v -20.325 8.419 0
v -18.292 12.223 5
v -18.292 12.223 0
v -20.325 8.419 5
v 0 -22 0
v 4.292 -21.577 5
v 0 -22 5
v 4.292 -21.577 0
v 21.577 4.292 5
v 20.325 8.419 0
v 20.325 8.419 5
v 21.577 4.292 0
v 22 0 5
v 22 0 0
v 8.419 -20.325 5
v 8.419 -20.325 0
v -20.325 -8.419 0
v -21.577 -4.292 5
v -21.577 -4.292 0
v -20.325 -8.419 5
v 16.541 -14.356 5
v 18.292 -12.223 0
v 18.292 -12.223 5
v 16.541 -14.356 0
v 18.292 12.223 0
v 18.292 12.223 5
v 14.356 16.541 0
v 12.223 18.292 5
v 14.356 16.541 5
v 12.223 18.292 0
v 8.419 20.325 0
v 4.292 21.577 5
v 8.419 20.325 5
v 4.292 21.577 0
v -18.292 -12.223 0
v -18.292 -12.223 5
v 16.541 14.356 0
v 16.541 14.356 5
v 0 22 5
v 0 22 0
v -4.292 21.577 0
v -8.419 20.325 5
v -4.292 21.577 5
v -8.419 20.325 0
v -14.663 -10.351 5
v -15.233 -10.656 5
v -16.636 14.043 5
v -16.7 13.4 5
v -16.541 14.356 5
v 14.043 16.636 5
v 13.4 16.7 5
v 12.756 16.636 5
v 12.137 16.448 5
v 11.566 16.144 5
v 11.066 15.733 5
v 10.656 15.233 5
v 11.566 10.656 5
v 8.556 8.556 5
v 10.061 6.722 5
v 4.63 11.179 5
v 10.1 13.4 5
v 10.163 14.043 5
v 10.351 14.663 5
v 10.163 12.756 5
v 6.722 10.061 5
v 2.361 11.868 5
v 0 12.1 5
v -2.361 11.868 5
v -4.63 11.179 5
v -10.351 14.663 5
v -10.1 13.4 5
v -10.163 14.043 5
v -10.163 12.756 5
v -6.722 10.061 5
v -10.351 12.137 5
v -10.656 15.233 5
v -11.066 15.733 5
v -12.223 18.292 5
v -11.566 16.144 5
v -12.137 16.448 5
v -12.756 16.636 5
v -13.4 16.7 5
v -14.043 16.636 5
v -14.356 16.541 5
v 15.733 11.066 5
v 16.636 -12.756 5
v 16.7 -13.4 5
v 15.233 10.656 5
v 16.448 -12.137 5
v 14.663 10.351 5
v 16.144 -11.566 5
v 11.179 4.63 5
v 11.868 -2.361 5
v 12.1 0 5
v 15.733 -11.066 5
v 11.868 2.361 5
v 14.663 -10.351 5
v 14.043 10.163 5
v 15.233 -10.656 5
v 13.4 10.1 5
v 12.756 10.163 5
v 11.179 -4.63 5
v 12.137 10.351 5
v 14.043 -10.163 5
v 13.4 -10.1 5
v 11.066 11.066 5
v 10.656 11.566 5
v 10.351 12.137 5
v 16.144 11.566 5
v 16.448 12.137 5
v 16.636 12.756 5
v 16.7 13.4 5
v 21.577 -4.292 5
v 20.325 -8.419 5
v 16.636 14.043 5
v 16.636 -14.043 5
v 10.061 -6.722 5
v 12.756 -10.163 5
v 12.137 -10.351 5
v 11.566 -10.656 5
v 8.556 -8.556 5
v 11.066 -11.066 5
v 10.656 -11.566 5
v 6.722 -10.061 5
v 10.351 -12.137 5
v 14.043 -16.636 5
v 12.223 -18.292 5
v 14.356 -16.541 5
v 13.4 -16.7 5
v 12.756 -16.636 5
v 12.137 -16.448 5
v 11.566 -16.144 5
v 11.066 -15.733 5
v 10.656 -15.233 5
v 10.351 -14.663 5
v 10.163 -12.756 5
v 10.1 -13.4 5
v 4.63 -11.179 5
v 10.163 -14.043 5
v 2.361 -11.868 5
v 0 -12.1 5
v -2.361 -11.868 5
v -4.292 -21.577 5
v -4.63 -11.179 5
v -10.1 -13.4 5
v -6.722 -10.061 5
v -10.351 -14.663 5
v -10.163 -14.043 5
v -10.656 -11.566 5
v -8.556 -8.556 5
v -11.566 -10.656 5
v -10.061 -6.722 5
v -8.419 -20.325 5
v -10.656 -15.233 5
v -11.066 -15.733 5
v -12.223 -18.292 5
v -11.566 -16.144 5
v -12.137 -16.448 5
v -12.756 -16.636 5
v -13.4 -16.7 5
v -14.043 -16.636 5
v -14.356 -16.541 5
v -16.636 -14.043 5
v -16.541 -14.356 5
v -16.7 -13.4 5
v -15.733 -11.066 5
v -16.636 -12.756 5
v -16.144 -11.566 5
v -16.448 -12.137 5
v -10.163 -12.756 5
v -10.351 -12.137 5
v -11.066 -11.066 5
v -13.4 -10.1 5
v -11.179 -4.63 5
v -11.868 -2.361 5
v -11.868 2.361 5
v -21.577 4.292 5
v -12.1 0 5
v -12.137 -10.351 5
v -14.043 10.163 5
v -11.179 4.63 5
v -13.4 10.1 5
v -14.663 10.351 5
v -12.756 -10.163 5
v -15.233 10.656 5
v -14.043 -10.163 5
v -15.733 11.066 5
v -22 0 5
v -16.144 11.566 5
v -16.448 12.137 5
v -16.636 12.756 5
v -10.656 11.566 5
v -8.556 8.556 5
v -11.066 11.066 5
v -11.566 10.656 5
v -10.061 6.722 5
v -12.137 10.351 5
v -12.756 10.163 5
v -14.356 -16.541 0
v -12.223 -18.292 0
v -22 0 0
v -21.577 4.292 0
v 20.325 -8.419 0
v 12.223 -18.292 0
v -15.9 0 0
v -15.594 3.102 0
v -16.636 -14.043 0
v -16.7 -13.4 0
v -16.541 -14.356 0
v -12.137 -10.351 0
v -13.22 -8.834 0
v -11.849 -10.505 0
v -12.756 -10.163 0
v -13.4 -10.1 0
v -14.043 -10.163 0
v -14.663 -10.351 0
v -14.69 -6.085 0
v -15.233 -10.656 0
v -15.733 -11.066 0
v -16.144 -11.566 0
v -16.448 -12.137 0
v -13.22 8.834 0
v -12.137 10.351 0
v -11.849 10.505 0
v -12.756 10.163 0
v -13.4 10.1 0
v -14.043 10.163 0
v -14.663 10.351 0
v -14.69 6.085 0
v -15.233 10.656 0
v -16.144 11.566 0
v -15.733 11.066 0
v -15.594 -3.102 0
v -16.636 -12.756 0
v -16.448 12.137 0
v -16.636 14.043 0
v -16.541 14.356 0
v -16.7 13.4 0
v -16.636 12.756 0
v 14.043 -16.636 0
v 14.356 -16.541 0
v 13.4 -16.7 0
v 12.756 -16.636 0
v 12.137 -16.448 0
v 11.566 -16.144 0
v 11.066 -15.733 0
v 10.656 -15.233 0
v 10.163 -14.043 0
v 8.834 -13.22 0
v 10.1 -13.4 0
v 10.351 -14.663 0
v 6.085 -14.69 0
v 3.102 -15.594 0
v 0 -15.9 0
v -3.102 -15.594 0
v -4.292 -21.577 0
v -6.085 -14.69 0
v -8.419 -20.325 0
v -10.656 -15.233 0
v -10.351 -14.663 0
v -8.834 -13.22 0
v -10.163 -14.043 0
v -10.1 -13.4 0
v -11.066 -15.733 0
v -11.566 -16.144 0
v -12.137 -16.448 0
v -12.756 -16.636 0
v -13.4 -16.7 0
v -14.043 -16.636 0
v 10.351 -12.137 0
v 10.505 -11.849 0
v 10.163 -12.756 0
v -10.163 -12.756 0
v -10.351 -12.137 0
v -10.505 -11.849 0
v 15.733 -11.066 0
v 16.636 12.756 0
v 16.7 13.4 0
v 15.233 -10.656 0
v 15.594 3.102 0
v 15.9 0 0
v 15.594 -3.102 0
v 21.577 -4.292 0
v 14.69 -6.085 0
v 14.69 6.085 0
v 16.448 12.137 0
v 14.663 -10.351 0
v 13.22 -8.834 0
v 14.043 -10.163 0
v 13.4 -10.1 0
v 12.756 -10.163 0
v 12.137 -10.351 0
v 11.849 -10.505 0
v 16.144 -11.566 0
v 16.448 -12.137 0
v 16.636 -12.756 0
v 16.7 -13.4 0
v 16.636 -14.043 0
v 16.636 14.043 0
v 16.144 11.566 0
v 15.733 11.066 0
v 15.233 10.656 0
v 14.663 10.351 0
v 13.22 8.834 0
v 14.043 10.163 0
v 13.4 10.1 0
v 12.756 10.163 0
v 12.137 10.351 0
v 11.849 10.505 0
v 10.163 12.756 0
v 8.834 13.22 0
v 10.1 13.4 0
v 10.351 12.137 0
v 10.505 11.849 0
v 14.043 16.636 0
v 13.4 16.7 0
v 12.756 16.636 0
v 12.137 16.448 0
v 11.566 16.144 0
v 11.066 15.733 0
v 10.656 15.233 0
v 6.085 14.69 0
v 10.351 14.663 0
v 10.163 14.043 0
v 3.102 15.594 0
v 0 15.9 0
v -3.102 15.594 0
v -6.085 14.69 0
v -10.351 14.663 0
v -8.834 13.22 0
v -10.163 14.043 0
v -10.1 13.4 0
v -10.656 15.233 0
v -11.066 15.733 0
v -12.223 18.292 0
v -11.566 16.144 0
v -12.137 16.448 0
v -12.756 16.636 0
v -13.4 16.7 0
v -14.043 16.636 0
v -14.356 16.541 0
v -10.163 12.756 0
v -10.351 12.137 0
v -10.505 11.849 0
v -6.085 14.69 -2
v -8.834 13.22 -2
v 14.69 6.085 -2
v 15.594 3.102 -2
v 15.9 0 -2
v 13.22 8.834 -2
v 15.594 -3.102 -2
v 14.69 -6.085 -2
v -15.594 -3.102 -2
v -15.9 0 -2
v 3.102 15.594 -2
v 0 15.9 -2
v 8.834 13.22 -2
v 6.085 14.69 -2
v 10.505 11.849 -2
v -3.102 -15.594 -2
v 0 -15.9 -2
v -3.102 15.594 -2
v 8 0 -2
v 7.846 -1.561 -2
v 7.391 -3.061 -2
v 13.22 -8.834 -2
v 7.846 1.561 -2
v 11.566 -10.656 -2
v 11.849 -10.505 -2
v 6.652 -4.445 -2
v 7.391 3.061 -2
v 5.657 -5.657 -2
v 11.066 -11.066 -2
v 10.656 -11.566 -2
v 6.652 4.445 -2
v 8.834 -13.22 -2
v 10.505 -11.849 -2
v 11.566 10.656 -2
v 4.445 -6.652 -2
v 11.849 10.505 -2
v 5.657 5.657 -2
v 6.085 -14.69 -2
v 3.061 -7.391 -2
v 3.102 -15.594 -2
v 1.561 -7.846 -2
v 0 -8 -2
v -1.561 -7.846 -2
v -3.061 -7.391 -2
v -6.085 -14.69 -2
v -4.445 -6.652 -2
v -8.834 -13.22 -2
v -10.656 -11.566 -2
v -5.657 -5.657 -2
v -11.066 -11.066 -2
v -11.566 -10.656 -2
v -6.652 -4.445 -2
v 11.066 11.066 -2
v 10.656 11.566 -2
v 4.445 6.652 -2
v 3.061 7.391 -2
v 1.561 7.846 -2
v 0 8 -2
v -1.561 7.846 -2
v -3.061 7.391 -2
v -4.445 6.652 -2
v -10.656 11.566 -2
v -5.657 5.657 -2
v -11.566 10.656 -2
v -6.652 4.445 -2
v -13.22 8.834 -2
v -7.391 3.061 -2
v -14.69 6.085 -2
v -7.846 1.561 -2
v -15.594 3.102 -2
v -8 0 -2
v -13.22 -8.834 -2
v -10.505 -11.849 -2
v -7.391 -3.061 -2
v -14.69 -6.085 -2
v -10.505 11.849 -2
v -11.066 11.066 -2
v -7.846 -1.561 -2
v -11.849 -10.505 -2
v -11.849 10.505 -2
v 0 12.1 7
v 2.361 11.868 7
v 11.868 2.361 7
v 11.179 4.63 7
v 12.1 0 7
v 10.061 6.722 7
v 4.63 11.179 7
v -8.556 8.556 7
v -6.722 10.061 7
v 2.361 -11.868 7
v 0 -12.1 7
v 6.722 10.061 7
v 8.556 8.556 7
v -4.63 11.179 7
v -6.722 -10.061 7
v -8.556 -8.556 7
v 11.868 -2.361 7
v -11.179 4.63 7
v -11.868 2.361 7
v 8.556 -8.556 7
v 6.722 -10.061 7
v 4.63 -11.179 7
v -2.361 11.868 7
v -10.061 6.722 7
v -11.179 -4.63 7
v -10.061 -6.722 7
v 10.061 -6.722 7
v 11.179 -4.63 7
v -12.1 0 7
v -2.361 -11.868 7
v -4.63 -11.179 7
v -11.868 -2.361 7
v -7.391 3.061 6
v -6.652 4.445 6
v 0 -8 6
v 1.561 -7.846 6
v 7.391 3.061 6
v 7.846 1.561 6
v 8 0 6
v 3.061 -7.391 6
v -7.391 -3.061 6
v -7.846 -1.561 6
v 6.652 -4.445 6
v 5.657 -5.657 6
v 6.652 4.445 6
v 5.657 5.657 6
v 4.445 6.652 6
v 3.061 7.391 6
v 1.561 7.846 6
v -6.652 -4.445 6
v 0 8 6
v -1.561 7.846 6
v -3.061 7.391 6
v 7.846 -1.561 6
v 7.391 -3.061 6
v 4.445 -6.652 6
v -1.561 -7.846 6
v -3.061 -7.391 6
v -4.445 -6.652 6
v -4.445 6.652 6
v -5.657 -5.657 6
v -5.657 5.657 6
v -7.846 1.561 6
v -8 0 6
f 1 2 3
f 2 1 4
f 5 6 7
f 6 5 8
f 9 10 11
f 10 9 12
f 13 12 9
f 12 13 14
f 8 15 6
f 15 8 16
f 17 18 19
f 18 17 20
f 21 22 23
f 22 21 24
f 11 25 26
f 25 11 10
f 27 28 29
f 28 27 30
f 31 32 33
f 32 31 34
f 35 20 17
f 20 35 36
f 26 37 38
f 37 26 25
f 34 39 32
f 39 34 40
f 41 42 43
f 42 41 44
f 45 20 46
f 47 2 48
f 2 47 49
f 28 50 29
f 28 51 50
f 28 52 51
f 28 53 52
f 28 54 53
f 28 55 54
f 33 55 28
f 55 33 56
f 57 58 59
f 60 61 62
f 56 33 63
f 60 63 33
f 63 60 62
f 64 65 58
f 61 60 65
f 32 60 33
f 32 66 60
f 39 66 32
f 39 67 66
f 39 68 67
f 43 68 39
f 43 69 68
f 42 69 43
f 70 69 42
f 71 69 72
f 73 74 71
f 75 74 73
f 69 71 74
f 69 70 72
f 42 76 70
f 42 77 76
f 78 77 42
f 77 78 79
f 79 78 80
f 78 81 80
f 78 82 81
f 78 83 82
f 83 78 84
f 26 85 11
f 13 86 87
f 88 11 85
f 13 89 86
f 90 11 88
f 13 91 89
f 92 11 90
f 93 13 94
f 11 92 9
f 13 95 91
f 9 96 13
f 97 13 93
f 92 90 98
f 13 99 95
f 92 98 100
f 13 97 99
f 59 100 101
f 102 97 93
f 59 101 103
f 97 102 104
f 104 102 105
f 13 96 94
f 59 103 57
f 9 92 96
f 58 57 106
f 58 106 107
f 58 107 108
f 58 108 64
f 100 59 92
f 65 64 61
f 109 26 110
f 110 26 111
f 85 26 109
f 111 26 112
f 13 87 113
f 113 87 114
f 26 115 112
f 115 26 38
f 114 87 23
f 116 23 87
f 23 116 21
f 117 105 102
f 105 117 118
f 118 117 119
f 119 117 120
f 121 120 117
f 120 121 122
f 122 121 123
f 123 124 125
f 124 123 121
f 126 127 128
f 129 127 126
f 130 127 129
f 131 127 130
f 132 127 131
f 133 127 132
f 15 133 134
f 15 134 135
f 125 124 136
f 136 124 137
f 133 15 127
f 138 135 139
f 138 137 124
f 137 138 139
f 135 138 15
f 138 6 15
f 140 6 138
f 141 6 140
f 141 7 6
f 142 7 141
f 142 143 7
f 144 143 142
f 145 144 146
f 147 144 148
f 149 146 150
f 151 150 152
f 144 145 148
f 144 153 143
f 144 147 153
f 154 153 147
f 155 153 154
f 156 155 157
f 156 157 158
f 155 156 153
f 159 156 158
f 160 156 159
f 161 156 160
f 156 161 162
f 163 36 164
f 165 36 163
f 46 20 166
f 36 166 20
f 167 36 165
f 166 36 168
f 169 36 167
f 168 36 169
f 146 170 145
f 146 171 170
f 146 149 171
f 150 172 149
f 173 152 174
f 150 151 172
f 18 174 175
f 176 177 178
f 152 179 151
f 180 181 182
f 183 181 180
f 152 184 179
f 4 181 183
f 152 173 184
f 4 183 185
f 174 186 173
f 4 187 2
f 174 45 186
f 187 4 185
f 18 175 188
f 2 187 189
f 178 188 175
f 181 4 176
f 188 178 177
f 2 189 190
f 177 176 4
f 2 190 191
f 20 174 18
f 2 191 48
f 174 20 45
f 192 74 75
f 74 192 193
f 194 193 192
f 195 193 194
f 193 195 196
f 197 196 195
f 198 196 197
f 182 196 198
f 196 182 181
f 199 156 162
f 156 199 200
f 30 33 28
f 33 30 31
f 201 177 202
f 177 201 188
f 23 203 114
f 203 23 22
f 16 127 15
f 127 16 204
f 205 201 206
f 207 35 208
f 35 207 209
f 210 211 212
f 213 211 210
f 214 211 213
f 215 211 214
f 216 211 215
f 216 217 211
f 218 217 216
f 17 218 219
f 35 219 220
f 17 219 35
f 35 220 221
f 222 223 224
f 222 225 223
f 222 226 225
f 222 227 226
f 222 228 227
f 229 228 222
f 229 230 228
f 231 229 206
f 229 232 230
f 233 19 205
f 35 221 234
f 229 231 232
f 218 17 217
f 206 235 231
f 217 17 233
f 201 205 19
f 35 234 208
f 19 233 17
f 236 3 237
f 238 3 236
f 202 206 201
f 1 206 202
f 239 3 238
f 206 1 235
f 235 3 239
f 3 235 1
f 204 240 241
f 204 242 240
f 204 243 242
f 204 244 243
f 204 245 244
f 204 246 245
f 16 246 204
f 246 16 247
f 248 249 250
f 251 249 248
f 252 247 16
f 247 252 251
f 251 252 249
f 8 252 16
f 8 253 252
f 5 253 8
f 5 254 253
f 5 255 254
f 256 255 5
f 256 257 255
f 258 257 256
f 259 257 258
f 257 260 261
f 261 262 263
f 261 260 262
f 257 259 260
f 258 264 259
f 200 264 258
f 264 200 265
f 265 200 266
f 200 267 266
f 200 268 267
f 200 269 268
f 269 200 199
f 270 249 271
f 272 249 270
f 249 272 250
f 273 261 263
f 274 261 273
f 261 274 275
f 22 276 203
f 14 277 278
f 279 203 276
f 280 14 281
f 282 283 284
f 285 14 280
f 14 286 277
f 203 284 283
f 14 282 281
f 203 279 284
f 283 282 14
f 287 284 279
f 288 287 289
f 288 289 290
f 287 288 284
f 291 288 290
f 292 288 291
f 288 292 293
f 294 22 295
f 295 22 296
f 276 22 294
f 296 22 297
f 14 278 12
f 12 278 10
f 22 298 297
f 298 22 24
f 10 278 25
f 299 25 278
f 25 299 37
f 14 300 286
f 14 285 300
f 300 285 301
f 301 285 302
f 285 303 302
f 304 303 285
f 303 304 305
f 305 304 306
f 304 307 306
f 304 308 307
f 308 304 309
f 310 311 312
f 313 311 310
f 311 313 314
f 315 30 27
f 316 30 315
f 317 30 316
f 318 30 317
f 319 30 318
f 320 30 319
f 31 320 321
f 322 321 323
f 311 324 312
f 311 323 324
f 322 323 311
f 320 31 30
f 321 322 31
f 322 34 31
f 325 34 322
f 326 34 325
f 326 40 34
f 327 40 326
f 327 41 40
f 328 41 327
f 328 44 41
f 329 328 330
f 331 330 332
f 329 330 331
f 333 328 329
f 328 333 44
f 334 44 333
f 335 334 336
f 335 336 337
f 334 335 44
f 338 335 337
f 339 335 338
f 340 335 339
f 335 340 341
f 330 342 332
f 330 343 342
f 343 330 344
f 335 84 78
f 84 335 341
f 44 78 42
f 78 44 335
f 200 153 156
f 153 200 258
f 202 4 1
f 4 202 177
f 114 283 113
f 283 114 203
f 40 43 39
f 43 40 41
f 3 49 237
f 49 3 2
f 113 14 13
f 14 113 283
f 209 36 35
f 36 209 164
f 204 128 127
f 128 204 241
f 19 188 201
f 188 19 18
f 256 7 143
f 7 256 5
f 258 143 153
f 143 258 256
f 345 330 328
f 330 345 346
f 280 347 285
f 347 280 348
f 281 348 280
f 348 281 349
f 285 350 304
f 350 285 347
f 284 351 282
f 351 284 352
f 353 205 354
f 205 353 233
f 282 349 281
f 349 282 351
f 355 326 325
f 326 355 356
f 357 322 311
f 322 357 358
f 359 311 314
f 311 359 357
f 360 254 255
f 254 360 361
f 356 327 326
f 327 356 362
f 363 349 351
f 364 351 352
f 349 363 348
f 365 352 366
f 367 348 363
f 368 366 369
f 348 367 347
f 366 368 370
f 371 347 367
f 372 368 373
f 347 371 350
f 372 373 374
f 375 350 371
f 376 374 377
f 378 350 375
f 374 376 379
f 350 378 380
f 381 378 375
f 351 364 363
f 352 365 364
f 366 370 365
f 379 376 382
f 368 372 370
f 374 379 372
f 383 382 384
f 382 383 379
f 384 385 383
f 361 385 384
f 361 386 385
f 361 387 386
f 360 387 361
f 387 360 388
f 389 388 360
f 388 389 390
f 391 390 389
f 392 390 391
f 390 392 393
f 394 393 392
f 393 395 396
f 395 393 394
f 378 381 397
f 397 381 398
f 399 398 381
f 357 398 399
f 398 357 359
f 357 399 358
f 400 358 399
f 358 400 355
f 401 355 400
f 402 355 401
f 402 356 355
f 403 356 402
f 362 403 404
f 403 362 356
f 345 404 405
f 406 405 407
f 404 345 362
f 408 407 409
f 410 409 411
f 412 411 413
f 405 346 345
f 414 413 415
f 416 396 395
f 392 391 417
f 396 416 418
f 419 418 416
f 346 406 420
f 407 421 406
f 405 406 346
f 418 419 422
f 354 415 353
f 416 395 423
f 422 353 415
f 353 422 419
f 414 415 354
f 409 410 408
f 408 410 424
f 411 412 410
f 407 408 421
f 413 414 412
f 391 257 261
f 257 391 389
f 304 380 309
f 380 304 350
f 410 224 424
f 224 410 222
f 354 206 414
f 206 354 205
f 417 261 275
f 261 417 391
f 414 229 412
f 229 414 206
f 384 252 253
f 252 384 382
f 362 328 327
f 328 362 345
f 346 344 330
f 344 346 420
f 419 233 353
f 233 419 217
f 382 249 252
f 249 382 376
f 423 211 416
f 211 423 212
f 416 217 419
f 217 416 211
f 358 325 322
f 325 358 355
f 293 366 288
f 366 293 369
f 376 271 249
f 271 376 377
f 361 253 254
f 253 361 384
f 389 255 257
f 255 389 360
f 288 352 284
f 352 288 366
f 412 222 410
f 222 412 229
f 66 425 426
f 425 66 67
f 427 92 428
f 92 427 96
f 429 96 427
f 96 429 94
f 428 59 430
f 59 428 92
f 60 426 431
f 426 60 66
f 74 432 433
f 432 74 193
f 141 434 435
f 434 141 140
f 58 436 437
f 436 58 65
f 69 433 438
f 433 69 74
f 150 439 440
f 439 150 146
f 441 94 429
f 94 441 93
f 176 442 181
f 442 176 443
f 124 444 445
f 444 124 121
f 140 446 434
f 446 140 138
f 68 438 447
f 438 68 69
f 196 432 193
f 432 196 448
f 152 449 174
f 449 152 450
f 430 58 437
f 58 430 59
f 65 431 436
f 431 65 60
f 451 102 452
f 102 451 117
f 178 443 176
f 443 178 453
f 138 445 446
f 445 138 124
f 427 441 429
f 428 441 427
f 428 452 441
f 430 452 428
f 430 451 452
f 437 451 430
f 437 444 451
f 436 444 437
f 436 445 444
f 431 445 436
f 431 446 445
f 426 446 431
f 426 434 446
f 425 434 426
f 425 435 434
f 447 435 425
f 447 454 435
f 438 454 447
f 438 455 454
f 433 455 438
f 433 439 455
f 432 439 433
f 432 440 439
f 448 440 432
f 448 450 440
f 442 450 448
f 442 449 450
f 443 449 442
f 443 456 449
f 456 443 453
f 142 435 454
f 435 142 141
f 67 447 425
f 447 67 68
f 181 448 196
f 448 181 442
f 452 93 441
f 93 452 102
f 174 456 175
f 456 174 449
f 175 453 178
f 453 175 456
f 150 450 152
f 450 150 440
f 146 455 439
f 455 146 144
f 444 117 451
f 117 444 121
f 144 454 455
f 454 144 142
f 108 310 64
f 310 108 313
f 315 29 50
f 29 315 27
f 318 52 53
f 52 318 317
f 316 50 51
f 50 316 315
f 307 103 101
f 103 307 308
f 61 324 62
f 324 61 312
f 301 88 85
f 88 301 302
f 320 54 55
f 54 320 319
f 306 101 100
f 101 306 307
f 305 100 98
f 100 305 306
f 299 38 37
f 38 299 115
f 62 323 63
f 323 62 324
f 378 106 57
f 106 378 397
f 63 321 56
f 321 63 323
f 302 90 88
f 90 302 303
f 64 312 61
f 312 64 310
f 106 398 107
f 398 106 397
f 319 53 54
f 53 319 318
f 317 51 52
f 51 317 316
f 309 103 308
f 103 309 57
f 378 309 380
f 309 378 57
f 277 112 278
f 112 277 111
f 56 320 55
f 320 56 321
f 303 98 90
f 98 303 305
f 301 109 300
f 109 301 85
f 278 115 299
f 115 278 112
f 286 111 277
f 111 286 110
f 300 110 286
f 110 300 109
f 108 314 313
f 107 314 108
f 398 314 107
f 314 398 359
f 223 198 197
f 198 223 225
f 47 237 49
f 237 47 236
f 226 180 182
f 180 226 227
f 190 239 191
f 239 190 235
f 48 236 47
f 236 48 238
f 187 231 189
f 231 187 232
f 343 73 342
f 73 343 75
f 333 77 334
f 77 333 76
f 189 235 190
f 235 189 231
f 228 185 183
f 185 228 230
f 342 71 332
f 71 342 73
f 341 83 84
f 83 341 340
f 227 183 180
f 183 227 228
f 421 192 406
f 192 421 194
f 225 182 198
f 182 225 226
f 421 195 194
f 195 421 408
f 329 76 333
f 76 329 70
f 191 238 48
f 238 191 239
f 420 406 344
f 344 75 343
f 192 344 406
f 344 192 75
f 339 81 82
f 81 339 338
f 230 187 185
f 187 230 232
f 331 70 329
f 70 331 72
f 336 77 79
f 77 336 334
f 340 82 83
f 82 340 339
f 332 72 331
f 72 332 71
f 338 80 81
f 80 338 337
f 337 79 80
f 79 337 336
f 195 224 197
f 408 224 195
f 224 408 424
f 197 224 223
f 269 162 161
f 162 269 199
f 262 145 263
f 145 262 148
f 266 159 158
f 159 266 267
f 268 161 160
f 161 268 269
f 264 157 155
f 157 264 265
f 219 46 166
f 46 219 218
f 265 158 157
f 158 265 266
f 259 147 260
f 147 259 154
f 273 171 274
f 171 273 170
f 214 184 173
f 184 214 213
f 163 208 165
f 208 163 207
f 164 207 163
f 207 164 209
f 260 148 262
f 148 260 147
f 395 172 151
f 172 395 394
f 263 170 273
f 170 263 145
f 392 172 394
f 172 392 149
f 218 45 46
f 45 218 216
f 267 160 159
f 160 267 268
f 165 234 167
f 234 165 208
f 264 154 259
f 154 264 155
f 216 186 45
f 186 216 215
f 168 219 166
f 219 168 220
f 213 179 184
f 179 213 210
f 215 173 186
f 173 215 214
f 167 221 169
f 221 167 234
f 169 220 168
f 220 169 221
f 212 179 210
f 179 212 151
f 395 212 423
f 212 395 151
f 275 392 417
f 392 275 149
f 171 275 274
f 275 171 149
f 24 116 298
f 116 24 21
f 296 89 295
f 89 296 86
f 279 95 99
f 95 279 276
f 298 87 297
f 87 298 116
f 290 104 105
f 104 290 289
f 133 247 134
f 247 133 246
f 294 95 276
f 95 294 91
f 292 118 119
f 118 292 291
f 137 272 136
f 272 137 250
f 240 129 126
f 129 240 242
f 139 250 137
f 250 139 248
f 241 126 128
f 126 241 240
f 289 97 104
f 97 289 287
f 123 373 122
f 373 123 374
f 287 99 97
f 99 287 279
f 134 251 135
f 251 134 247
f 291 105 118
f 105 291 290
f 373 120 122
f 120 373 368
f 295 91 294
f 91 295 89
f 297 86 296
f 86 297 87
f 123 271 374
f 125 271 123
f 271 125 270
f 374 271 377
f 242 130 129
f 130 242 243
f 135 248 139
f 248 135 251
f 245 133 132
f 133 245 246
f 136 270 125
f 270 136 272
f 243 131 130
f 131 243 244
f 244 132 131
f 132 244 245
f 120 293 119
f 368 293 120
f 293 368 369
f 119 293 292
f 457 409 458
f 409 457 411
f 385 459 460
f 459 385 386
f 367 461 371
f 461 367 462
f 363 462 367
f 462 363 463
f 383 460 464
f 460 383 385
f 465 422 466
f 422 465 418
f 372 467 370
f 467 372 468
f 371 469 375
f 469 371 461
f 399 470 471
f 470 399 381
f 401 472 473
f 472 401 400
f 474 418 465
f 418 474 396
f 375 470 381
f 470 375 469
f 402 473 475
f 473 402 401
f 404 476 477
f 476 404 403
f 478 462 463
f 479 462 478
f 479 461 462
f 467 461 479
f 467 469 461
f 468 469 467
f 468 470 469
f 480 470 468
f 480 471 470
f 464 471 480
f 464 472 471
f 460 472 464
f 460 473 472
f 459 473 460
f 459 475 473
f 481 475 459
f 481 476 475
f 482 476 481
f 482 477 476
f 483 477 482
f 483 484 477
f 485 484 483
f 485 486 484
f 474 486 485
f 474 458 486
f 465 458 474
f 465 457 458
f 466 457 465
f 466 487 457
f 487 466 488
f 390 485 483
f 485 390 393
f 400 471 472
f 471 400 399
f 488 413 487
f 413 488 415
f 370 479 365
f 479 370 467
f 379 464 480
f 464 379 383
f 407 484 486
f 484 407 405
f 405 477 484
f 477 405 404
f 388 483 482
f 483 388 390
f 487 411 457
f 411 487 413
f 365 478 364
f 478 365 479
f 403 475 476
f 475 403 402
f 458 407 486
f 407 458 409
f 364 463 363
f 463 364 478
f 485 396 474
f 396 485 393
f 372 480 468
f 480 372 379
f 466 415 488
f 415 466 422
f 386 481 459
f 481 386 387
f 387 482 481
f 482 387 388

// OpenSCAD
$fn = 32;

// ----------------------------------------------------------------------
// Retaining cap: 6002 cover, 44 mm, spigot 31.8 mm
// ----------------------------------------------------------------------

// --- parameters (mm) ---
plate_d = 44;             // cover diameter
plate_t = 5;              // cover thickness
boss_d = 31.8;            // spigot that enters the housing
boss_h = 2;               // spigot height
shaft_d = 16;             // shaft opening
bolt_d = 6.6;             // bolt clearance
bolt_r = 18.95;           // bolt circle radius
dome_h = 2;               // raised centre

module cover() {
  cylinder(h = plate_t, d = plate_d);
}

module spigot() {
  /* sunk 1 mm into the cover; the spigot sets the overall height */
  translate([0, 0, -boss_h]) cylinder(h = boss_h + 1, d = boss_d);
}

module dome() {
  translate([0, 0, plate_t - 1]) cylinder(h = dome_h + 1, d = plate_d * 0.55);
}

difference() {
  union() {
    cover();
    spigot();
    dome();
  }
  for (i = [0 : 3]) rotate([0, 0, 45 + i * 90]) translate([bolt_r, 0, -boss_h - 1])
    cylinder(h = boss_h + plate_t + 2, d = bolt_d);
  translate([0, 0, -boss_h - 1]) cylinder(h = boss_h + plate_t + 2, d = shaft_d);
}
